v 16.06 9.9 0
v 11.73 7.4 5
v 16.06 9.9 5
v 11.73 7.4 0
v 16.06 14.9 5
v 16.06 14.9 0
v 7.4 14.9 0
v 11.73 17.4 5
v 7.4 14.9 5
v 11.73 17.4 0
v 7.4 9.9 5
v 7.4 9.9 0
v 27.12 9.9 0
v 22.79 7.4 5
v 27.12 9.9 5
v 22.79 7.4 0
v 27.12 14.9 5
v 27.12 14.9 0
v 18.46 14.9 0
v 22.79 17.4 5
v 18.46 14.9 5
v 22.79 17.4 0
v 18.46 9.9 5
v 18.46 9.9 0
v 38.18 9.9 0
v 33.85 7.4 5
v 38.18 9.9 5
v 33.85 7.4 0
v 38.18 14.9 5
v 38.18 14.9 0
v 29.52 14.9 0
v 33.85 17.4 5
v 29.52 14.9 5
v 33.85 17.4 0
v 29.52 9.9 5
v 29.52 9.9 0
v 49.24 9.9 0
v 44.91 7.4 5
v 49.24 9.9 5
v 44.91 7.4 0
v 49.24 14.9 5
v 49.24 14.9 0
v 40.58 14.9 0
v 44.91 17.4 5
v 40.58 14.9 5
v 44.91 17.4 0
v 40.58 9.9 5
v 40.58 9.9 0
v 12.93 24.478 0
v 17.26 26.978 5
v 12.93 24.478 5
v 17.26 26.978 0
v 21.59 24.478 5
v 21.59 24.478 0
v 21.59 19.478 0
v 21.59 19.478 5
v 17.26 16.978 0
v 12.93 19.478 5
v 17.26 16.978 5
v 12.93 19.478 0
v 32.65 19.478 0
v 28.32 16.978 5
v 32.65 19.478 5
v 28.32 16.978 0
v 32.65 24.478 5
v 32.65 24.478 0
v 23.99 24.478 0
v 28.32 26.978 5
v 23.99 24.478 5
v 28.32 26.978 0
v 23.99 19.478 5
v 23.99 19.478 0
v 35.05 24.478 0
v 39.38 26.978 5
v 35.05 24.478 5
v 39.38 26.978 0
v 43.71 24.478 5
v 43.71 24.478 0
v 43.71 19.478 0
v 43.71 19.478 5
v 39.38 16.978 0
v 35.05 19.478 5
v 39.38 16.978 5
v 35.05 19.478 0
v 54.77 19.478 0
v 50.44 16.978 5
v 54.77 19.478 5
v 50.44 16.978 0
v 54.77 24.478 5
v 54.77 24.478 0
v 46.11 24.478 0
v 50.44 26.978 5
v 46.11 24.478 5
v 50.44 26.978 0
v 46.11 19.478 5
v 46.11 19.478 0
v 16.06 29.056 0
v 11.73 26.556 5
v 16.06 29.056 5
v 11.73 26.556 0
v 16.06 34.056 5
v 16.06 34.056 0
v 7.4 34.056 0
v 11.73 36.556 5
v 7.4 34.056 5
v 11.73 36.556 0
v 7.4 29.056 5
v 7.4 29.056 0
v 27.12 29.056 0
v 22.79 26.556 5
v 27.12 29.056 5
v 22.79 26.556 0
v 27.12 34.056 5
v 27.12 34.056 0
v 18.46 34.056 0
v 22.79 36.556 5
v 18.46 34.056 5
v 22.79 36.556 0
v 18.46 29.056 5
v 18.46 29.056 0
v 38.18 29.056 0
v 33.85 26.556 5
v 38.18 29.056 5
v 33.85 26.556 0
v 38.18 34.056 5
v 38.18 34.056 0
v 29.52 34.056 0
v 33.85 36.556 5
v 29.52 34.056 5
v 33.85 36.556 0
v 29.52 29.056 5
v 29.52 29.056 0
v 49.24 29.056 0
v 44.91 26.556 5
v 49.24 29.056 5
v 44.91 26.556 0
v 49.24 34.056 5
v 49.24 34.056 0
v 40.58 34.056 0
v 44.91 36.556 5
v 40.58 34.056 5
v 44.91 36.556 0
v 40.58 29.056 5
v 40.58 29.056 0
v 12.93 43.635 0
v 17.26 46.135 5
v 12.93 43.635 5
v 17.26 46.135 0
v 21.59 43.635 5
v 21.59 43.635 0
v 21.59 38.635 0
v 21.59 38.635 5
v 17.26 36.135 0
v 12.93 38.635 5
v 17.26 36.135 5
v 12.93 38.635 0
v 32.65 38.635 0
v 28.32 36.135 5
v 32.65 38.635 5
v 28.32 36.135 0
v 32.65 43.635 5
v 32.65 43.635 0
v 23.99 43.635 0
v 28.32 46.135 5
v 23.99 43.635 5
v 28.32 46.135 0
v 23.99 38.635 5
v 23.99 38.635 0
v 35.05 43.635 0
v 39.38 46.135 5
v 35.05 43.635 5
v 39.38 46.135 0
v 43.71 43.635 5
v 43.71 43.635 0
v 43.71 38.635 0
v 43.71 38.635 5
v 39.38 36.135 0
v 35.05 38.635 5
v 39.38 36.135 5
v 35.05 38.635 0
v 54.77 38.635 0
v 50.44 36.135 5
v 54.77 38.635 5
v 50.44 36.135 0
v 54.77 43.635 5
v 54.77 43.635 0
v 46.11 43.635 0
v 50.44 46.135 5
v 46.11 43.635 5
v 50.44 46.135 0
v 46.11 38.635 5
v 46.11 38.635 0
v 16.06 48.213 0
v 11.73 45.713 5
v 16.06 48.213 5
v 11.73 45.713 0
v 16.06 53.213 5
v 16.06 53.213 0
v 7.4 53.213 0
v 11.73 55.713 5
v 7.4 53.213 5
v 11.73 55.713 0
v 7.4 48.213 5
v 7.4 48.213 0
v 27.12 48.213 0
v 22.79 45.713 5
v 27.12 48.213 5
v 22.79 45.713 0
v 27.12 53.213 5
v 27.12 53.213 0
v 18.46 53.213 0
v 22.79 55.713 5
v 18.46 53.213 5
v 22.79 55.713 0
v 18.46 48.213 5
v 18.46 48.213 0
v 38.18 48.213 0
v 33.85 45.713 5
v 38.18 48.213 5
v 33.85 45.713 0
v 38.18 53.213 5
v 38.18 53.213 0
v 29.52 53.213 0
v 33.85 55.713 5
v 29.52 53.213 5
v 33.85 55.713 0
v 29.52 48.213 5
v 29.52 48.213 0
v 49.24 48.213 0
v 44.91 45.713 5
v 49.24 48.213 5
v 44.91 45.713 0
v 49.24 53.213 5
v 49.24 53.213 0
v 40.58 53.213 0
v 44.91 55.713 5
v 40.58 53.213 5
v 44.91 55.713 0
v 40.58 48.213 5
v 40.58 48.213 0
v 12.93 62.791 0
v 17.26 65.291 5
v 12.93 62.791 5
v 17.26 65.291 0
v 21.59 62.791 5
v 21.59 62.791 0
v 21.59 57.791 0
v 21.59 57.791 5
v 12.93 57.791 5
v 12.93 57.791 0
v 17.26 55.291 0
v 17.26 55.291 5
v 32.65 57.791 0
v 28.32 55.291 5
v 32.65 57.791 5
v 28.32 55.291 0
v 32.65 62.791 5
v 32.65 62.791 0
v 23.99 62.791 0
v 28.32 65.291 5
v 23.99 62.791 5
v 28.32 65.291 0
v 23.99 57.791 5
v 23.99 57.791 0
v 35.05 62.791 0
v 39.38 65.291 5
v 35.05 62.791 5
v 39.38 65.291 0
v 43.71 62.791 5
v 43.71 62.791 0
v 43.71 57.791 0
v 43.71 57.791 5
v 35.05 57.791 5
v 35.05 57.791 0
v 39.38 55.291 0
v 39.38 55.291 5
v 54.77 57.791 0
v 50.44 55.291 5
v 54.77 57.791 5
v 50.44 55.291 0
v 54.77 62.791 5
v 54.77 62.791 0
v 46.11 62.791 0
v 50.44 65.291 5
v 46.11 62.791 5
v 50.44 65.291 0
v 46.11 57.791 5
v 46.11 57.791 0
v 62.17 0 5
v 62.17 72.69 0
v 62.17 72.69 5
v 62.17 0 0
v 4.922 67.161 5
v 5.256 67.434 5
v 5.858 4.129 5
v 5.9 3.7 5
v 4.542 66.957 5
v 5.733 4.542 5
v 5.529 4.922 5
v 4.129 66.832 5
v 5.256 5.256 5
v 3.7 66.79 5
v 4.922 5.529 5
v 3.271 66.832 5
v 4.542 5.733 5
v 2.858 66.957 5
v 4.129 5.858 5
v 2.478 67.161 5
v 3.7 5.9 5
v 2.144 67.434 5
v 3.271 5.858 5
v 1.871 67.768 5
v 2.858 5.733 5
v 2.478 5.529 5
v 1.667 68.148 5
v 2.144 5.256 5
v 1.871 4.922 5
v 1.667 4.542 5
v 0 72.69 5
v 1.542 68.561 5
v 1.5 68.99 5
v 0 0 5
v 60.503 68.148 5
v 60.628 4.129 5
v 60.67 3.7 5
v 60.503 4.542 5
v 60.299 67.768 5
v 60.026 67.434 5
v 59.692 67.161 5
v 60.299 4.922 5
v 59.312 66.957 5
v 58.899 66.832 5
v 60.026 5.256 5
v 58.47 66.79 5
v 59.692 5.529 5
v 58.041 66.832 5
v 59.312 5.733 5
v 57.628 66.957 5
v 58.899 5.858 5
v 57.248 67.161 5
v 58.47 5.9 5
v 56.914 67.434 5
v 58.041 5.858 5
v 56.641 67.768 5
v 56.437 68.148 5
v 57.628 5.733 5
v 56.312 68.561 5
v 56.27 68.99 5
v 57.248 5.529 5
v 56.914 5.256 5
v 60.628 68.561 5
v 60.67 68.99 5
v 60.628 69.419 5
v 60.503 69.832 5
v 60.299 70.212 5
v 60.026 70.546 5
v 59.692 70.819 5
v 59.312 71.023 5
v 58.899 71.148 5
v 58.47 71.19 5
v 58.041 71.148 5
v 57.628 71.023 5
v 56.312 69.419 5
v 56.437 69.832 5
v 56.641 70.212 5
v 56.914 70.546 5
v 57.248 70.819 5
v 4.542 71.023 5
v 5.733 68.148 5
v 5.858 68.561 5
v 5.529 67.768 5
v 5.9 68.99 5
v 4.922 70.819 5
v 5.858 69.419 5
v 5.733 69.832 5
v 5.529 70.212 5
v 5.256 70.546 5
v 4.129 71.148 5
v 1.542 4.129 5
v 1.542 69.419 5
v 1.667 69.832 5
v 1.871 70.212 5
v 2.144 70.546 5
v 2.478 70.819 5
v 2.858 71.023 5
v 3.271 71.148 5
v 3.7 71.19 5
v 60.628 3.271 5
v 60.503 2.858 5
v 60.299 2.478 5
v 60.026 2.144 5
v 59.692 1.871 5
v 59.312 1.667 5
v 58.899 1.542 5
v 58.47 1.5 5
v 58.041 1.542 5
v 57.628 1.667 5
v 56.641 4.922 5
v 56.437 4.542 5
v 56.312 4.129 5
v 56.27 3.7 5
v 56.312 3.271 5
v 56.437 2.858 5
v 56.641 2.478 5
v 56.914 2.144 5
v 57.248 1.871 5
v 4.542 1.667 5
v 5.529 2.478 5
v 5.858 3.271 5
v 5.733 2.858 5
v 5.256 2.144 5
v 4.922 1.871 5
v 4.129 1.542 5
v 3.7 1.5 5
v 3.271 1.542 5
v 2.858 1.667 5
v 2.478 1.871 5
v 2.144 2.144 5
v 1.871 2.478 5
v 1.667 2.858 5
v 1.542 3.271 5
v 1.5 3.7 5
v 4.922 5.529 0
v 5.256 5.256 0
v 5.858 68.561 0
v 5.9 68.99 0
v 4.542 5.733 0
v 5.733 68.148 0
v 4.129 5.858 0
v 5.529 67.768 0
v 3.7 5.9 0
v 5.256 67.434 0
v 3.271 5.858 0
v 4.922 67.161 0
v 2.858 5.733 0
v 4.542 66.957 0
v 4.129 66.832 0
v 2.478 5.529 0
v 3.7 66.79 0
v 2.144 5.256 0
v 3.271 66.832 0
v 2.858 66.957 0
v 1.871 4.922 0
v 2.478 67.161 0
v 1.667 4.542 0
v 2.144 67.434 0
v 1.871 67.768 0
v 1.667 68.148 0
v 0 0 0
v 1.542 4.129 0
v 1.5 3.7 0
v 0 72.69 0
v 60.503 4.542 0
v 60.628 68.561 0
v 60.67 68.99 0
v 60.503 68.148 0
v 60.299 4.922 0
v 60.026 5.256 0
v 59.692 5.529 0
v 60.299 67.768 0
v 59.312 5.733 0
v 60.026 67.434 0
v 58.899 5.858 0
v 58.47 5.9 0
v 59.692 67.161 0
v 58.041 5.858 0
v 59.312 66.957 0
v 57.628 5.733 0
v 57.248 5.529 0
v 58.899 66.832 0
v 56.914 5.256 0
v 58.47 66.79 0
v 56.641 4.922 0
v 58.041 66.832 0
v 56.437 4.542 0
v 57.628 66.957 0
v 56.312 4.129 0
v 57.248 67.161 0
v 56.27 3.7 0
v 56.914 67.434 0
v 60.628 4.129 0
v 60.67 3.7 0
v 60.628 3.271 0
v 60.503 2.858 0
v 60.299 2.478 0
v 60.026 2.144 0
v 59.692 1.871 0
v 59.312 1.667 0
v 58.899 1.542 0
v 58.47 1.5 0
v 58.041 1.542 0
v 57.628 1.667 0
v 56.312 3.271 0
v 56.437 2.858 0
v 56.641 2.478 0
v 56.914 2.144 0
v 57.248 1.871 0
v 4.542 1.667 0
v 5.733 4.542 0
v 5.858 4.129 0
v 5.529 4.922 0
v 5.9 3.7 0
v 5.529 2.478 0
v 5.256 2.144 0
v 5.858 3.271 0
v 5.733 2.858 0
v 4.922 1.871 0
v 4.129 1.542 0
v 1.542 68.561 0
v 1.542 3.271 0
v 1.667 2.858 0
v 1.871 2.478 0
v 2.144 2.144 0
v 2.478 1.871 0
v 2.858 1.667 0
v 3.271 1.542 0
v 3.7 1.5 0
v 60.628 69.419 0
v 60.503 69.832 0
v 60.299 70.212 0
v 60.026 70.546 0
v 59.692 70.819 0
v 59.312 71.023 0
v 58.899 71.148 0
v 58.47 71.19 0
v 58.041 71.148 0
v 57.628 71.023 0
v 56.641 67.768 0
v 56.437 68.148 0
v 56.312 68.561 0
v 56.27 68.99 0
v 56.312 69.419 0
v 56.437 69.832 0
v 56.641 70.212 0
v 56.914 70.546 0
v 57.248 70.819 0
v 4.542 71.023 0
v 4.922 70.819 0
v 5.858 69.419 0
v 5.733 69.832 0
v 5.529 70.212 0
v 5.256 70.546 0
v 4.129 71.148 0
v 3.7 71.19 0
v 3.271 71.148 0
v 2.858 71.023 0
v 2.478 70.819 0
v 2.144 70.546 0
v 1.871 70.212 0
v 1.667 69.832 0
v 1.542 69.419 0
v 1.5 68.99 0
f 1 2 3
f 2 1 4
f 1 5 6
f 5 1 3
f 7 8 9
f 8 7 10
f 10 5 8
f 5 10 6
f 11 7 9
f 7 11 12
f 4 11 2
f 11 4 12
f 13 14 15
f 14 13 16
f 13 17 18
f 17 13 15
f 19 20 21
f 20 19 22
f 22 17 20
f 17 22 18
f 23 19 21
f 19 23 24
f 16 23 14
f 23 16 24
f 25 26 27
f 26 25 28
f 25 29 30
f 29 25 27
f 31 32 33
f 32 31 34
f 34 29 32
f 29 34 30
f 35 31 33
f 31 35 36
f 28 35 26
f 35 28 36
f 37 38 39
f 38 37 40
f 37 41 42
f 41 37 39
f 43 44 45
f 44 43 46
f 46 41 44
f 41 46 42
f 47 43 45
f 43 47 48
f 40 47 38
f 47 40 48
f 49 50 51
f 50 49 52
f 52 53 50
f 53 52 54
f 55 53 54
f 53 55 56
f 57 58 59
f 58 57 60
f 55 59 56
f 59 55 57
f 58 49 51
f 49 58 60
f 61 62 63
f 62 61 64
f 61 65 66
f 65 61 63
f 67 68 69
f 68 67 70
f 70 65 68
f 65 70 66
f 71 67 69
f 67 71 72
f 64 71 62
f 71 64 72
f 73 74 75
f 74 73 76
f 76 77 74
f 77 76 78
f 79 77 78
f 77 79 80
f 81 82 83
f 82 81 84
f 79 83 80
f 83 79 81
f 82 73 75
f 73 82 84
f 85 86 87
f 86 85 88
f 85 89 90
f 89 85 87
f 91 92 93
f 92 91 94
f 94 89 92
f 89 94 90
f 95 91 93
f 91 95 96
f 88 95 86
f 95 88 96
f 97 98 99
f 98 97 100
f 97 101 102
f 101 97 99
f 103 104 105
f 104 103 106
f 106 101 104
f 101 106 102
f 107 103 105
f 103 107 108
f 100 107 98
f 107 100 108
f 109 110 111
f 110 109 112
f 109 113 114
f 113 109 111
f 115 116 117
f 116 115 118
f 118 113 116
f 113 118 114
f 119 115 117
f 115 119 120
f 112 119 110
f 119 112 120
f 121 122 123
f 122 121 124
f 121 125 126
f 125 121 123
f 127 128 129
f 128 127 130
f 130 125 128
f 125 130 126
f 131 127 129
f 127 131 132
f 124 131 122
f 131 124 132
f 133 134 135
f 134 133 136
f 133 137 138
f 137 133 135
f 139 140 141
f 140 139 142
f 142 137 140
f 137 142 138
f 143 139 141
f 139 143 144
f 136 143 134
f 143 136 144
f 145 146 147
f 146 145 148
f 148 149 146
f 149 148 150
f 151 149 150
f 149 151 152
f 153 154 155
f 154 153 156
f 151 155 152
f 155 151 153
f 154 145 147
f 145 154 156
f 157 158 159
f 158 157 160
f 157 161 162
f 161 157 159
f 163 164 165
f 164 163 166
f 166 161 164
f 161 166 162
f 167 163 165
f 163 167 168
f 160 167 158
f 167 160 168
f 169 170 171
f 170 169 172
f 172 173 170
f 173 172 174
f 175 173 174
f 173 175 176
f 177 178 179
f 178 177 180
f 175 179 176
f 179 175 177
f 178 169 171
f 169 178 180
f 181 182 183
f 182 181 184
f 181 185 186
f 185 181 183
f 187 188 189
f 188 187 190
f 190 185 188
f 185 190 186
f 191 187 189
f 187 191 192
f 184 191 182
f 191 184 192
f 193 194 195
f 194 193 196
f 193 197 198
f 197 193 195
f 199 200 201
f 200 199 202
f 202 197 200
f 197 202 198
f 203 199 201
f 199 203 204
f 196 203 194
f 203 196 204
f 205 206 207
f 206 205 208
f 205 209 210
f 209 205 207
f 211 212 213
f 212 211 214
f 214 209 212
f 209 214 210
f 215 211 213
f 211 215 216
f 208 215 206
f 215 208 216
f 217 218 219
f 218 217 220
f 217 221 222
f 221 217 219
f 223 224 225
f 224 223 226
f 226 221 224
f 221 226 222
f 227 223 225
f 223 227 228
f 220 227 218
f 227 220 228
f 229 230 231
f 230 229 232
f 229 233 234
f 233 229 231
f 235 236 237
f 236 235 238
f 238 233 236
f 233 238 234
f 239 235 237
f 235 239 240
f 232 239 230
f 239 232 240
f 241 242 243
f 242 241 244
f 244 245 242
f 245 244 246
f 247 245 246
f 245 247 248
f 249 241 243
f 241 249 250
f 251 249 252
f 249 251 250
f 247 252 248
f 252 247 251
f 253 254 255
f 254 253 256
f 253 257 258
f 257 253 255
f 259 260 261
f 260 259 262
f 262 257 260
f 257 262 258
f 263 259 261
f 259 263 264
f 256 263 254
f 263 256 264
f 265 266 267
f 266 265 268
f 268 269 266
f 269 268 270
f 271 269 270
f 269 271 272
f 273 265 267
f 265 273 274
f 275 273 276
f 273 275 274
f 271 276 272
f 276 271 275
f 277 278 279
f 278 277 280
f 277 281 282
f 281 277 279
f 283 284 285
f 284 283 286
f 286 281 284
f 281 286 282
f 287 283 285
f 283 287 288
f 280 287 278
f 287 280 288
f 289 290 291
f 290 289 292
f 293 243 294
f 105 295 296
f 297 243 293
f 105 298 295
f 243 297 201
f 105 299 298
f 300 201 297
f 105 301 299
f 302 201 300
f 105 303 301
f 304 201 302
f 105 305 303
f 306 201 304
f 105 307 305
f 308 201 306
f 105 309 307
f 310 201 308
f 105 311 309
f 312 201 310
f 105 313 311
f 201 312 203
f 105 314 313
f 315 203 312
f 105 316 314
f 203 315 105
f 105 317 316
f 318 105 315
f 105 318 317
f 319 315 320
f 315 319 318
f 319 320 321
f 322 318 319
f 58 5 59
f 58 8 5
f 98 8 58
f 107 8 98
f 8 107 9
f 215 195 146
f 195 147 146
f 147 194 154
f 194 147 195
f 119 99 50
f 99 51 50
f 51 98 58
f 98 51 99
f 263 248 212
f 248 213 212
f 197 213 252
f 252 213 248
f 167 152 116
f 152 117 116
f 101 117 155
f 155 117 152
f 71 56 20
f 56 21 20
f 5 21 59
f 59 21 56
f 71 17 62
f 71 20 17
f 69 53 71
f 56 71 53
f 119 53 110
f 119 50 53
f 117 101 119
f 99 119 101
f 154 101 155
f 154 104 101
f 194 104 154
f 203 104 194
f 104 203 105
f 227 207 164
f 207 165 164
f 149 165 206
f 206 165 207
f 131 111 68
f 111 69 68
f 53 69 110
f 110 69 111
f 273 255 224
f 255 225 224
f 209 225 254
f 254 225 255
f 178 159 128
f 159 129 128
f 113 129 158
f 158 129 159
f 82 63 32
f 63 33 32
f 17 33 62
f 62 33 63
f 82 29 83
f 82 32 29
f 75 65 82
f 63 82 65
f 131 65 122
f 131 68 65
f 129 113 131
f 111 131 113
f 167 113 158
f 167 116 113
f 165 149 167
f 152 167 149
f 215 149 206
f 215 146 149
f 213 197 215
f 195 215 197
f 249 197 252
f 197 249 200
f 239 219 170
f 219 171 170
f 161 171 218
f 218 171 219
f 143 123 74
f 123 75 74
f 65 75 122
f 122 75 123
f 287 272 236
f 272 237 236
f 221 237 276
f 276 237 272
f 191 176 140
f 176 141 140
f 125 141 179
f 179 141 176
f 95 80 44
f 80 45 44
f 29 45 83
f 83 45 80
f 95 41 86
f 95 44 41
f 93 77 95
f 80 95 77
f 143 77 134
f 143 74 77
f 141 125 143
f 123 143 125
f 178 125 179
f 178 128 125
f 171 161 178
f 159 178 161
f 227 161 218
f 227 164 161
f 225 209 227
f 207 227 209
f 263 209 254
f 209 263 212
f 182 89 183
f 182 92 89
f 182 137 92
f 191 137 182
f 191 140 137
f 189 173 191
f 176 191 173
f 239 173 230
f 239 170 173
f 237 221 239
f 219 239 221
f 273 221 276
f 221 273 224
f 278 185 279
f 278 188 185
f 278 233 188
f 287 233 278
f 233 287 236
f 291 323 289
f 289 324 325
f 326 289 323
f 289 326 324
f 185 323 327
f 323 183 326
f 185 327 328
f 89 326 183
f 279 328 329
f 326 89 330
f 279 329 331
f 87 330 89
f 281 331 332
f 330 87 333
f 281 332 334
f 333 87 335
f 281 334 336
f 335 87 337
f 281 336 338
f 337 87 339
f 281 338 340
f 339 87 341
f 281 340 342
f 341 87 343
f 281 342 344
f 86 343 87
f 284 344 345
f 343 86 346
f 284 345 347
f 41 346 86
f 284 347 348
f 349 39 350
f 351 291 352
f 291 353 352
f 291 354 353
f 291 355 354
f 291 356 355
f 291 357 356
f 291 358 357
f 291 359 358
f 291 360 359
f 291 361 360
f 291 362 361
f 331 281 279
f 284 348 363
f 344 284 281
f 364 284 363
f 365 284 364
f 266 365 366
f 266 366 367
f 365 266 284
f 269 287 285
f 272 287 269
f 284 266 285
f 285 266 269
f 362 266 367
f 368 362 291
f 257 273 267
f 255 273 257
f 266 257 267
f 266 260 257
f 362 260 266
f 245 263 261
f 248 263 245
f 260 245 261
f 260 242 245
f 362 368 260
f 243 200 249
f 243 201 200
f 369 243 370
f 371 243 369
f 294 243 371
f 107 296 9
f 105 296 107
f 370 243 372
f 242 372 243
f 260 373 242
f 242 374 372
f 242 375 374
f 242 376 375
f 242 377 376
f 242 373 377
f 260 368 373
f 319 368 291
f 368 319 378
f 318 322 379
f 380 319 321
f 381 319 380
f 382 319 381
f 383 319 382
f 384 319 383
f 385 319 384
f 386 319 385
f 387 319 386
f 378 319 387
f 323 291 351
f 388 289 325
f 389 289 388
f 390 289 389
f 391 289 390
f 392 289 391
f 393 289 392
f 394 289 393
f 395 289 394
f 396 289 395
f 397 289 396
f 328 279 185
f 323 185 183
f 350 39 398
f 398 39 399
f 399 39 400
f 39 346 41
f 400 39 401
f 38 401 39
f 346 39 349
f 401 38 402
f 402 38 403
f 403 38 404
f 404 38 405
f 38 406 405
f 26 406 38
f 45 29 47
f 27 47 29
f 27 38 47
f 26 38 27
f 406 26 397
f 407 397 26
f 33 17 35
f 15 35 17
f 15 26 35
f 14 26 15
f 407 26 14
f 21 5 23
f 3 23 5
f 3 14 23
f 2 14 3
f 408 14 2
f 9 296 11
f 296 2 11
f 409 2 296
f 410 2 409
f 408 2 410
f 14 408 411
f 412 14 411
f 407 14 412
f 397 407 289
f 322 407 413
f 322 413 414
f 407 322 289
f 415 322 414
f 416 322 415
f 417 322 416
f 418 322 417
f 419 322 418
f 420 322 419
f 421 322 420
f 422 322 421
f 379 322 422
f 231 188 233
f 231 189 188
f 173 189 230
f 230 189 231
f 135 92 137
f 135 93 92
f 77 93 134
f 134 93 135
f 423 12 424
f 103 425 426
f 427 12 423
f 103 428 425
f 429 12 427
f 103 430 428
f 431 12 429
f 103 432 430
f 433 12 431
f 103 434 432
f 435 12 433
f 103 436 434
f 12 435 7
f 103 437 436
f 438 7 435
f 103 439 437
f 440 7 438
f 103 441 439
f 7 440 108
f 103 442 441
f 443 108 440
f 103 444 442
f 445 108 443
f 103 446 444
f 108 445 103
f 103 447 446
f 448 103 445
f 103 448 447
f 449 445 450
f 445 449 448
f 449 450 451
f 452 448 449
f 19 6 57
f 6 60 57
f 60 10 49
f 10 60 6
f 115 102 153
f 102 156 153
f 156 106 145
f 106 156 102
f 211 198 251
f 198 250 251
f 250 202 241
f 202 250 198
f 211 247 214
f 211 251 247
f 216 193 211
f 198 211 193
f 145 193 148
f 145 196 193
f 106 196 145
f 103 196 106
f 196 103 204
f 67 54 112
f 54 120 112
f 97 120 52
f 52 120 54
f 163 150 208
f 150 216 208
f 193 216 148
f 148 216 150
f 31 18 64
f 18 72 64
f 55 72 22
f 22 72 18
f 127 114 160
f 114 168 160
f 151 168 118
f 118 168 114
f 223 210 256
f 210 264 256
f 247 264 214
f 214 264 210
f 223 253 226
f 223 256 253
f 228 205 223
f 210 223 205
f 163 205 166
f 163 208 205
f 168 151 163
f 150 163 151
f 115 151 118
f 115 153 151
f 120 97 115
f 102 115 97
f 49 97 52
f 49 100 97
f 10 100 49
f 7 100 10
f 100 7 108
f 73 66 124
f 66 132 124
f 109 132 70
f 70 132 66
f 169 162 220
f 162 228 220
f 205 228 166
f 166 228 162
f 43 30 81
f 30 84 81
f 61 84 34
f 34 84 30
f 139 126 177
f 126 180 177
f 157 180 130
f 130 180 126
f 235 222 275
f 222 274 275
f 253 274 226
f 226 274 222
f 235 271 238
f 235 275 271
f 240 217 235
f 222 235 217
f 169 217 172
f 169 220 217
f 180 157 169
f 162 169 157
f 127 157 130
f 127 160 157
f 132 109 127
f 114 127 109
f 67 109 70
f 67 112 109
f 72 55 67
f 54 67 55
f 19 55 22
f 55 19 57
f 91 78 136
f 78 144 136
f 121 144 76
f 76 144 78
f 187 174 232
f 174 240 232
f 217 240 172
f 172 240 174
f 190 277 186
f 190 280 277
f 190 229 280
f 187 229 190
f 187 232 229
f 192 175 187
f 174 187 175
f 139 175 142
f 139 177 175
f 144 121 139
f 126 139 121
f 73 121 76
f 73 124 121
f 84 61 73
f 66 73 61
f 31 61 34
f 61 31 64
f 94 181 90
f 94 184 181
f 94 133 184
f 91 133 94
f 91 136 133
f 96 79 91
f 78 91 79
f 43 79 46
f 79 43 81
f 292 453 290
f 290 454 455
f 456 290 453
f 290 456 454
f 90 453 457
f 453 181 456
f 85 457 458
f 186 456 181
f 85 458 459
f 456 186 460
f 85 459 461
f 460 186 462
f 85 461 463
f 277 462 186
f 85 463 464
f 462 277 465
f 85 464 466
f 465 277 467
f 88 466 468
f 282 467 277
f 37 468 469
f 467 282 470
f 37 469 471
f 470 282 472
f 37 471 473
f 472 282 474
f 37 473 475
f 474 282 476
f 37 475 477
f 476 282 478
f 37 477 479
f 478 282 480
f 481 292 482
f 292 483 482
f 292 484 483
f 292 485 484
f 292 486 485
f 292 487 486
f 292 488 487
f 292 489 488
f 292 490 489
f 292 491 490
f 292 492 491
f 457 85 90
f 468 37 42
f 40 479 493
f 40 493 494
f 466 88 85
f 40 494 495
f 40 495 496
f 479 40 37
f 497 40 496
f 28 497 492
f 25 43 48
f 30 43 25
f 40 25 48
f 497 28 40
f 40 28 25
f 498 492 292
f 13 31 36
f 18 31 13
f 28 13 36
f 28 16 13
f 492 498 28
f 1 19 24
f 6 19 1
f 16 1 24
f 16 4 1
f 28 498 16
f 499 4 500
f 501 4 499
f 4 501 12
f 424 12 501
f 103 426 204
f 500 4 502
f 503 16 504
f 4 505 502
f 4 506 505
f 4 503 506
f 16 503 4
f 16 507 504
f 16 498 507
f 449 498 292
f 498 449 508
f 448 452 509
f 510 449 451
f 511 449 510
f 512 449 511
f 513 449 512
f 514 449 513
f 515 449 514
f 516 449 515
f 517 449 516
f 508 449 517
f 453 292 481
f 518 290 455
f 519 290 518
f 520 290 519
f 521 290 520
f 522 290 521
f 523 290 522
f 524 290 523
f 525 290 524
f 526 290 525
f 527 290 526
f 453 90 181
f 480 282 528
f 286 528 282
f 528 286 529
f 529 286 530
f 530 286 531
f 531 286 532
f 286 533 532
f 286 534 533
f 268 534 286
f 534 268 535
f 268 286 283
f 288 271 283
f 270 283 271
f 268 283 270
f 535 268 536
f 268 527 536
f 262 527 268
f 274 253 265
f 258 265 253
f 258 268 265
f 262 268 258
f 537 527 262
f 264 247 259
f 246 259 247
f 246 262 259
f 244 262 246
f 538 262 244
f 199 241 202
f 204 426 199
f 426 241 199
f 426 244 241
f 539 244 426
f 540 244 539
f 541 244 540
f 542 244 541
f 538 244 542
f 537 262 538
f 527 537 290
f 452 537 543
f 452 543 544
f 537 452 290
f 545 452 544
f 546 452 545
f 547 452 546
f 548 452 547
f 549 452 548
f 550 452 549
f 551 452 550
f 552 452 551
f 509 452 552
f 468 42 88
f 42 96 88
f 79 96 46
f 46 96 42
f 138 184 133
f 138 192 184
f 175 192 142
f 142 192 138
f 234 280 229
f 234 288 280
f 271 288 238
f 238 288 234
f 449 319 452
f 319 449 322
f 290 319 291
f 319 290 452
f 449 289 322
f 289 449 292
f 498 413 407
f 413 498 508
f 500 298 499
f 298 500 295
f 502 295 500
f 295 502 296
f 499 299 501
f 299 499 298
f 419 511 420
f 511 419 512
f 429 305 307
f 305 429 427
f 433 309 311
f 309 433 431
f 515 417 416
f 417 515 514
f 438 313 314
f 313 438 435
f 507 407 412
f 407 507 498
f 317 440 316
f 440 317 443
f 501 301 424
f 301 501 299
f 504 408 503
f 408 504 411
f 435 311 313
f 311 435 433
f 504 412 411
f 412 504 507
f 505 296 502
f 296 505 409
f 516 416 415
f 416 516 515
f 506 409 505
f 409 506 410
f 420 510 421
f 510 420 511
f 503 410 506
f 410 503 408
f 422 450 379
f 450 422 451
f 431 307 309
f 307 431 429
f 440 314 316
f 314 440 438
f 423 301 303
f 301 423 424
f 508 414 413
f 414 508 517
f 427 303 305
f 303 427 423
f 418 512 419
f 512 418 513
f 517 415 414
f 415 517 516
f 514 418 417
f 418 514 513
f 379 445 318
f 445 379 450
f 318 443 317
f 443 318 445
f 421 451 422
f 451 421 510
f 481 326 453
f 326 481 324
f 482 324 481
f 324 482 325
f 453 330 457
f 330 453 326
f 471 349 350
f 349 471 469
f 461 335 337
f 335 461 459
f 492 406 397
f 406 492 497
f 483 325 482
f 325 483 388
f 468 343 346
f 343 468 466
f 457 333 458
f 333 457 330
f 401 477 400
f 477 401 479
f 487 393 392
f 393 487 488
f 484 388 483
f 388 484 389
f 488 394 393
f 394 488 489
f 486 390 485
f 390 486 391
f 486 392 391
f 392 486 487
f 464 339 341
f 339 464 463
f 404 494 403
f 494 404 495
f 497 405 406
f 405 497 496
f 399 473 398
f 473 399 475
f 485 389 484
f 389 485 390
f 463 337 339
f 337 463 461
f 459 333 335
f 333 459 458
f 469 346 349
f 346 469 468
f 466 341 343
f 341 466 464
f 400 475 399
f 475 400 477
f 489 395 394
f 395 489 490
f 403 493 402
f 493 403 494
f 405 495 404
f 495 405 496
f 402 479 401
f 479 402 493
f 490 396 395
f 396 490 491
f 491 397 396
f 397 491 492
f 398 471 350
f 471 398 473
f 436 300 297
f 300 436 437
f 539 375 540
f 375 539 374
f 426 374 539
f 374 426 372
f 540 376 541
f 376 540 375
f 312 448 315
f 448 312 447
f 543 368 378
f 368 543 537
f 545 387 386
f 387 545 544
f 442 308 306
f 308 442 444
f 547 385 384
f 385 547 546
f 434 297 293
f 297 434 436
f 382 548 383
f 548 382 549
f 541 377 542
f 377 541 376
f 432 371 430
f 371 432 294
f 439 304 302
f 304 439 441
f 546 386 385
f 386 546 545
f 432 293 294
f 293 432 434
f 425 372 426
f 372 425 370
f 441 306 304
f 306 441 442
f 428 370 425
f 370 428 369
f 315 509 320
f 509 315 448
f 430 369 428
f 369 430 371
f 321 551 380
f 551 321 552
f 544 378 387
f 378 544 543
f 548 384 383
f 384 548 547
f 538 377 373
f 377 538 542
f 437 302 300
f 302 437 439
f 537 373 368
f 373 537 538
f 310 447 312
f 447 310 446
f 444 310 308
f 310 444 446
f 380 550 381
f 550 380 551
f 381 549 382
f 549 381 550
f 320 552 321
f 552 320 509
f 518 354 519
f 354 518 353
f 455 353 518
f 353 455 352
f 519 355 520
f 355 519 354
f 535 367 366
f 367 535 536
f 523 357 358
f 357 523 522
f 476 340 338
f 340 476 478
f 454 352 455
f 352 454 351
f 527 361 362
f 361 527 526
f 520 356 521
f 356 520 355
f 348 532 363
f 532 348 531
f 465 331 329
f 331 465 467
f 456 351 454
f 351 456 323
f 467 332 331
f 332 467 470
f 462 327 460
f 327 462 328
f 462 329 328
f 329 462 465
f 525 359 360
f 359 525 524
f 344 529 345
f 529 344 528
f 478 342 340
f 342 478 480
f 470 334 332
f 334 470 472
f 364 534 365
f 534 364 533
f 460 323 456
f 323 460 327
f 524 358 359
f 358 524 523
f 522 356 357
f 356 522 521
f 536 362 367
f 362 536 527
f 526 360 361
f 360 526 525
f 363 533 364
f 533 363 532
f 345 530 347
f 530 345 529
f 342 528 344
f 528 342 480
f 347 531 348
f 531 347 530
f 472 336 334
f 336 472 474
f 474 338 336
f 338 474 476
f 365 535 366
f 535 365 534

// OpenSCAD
$fn = 32;

// ----------------------------------------------------------------------
// Honeycomb panel: 62.17 x 72.69 mm, 24 cells of 10 mm
// ----------------------------------------------------------------------

// --- parameters (mm) ---
panel_w = 62.17;          // panel width
panel_d = 72.69;          // panel depth
thick = 5;                // panel thickness
cell_r = 5;               // hex cell circumradius
pitch = 11.06;            // hex cell pitch (centre to centre)
web = 2.4;                // web between the cells
columns = 4;              // columns of cells
rows = 6;                 // rows of cells
cell_count = 24;          // total cells
shift_x = 11.73;          // first cell offset in x
shift_y = 12.4;           // first cell offset in y
mount_d = 4.4;            // corner mounting holes
hole_off = 3.7;           // mounting hole offset from the corners

difference() {
  union() {
    cube([panel_w, panel_d, thick]);
  }
  /* hexagonal cells, point-up, cut right through the plate */
  for (row = [0 : rows - 1]) {
    for (col = [0 : columns - 1]) {
      translate([shift_x + col * pitch + (row % 2) * pitch / 2, shift_y + row * pitch * 0.866025, -2.5]) rotate([0, 0, 30]) cylinder(h = thick + 5, d = 2 * cell_r, $fn = 6);
    }
  }
  /* corner mounting holes, clear of the outer cell web */
  translate([3.7, 3.7, -2.5]) cylinder(h = thick + 5, d = mount_d);
  translate([58.47, 3.7, -2.5]) cylinder(h = thick + 5, d = mount_d);
  translate([3.7, 68.99, -2.5]) cylinder(h = thick + 5, d = mount_d);
  translate([58.47, 68.99, -2.5]) cylinder(h = thick + 5, d = mount_d);
}
